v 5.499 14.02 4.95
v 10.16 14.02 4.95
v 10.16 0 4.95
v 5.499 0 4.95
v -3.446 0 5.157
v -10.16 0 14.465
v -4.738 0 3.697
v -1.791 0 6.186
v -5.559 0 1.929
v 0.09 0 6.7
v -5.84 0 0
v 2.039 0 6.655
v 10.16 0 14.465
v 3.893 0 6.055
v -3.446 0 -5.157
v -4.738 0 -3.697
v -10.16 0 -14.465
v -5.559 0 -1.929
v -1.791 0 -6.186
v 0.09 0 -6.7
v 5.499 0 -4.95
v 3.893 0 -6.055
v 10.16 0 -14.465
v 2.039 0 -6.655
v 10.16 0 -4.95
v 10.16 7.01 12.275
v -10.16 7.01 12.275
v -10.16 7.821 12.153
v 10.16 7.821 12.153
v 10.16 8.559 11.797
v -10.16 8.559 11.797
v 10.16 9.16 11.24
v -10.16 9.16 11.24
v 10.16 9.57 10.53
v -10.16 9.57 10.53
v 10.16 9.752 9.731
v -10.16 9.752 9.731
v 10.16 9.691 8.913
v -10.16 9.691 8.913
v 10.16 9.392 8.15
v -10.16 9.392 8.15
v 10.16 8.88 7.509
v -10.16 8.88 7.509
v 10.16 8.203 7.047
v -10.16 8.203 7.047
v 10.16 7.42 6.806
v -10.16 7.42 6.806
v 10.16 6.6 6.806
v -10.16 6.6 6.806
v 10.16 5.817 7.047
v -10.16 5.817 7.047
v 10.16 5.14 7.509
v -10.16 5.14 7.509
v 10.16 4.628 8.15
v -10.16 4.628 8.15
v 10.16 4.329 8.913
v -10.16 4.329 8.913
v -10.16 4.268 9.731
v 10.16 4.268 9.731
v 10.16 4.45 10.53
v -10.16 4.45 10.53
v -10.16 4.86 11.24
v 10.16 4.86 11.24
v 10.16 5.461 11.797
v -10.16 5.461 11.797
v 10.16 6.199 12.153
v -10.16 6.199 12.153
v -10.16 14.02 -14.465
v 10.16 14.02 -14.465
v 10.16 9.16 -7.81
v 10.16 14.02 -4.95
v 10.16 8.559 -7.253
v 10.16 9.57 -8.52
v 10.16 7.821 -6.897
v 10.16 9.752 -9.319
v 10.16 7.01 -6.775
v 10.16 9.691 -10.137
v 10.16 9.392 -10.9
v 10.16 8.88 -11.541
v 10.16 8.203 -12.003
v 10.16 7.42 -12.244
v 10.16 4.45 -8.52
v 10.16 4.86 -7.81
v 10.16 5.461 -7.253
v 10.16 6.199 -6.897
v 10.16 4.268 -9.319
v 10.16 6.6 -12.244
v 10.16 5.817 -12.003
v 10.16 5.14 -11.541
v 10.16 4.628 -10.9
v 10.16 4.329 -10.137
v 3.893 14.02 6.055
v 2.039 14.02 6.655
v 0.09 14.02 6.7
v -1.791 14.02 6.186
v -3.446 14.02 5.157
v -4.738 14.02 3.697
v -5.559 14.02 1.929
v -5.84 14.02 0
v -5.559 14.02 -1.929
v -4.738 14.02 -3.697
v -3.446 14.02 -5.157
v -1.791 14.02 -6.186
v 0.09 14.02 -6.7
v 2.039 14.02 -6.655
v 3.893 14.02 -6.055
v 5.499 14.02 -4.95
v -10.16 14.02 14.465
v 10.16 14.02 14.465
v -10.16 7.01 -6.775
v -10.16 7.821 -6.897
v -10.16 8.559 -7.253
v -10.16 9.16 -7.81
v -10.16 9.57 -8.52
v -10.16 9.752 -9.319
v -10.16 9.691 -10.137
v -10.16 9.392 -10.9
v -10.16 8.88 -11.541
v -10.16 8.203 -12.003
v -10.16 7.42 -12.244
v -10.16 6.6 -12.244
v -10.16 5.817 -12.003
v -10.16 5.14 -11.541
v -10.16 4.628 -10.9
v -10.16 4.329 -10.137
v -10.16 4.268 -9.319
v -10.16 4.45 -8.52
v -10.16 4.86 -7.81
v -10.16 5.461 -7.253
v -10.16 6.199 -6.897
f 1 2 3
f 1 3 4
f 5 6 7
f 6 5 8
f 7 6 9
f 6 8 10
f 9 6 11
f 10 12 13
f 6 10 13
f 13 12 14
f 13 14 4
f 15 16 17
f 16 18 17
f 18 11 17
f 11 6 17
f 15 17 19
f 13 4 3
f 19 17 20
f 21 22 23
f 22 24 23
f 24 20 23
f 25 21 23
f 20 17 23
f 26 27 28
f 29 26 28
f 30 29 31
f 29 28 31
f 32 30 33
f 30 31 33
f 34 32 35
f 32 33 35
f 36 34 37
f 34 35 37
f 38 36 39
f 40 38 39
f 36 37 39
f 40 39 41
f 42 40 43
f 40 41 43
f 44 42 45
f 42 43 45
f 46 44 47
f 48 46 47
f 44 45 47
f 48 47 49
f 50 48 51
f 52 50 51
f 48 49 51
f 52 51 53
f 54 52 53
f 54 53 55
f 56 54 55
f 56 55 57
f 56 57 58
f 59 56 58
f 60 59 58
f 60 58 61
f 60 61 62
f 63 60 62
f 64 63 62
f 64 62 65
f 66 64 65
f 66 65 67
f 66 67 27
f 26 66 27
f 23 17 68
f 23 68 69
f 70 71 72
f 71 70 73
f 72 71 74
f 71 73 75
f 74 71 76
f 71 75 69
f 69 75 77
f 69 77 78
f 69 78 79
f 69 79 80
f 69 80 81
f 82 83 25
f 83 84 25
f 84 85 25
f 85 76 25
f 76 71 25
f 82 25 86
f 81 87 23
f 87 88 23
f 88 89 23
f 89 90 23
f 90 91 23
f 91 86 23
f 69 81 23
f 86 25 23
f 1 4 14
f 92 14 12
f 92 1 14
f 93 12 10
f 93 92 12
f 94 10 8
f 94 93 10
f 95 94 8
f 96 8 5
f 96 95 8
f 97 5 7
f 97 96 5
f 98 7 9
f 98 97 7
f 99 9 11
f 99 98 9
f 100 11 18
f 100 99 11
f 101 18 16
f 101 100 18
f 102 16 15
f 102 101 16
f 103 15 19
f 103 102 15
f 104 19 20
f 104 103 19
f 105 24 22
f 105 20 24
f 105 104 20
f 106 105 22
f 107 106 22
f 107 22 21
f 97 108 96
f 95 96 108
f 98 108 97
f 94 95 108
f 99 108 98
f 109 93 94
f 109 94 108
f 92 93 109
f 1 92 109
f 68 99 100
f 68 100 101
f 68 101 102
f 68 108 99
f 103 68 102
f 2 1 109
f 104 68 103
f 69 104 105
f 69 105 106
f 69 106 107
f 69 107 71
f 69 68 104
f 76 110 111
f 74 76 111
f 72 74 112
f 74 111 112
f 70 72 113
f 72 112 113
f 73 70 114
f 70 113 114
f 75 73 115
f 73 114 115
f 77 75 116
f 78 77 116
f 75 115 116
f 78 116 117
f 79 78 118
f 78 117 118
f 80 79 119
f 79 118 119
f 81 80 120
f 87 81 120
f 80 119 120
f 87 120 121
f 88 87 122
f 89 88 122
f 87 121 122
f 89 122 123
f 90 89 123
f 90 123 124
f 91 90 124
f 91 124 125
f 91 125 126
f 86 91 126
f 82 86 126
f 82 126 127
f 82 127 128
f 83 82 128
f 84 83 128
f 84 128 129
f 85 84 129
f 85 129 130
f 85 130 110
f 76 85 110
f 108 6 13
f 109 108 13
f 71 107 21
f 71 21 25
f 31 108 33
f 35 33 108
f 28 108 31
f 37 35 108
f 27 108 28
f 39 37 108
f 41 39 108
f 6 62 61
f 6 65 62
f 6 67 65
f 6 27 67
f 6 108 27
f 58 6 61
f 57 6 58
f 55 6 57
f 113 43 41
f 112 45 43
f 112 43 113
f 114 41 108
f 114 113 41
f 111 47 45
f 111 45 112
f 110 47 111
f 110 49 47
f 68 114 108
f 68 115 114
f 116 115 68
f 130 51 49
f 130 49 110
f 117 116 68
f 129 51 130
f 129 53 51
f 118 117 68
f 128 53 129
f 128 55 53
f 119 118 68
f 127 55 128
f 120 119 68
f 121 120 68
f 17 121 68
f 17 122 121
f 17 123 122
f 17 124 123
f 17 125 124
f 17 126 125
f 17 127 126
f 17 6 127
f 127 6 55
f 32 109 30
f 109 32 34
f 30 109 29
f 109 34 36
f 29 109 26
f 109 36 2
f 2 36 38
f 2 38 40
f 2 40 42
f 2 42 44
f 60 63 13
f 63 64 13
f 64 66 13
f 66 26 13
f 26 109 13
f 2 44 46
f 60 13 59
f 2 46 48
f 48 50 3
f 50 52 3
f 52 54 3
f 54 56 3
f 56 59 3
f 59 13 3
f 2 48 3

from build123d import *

# Parameters (mm, degrees)
SKETCH1_W           = 20.32
SKETCH1_H           = 28.93
BOSS_EXTRUDE1_DEPTH = 14.02
CUT_EXTRUDE1_DEPTH  = 15.02
SKETCH3_R           = 2.75
CUT_EXTRUDE2_DEPTH  = 21.32


with BuildPart() as part:
    # Sketch1 → Boss-Extrude1 (new body)
    with BuildSketch(Plane(origin=(0, 0, 0), x_dir=(1, 0, 0), z_dir=(0, 1, 0))):
        Rectangle(SKETCH1_W, SKETCH1_H)
    extrude(amount=BOSS_EXTRUDE1_DEPTH)

    # Sketch2 → Cut-Extrude1 (cut, through all)
    with BuildSketch(Plane(origin=(0, 14.02, 0), x_dir=(1, 0, 0), z_dir=(0, 1, 0))):
        with BuildLine():
            Line((10.16, -4.95), (5.499117562, -4.95))
            ThreePointArc((5.499117562, -4.95), (-5.84, 0), (5.499117562, 4.95))
            Line((5.499117562, 4.95), (10.16, 4.95))
            Line((10.16, 4.95), (10.16, -4.95))
        make_face()
    extrude(amount=-CUT_EXTRUDE1_DEPTH, mode=Mode.SUBTRACT)

    # Sketch3 → Cut-Extrude2 (cut, through all)
    with BuildSketch(Plane.ZY.offset(10.16)):
        with Locations((9.525, 7.01)):
            Circle(SKETCH3_R)
        with Locations((-9.525, 7.01)):
            Circle(SKETCH3_R)
    extrude(amount=-CUT_EXTRUDE2_DEPTH, mode=Mode.SUBTRACT)


solid = part.part
